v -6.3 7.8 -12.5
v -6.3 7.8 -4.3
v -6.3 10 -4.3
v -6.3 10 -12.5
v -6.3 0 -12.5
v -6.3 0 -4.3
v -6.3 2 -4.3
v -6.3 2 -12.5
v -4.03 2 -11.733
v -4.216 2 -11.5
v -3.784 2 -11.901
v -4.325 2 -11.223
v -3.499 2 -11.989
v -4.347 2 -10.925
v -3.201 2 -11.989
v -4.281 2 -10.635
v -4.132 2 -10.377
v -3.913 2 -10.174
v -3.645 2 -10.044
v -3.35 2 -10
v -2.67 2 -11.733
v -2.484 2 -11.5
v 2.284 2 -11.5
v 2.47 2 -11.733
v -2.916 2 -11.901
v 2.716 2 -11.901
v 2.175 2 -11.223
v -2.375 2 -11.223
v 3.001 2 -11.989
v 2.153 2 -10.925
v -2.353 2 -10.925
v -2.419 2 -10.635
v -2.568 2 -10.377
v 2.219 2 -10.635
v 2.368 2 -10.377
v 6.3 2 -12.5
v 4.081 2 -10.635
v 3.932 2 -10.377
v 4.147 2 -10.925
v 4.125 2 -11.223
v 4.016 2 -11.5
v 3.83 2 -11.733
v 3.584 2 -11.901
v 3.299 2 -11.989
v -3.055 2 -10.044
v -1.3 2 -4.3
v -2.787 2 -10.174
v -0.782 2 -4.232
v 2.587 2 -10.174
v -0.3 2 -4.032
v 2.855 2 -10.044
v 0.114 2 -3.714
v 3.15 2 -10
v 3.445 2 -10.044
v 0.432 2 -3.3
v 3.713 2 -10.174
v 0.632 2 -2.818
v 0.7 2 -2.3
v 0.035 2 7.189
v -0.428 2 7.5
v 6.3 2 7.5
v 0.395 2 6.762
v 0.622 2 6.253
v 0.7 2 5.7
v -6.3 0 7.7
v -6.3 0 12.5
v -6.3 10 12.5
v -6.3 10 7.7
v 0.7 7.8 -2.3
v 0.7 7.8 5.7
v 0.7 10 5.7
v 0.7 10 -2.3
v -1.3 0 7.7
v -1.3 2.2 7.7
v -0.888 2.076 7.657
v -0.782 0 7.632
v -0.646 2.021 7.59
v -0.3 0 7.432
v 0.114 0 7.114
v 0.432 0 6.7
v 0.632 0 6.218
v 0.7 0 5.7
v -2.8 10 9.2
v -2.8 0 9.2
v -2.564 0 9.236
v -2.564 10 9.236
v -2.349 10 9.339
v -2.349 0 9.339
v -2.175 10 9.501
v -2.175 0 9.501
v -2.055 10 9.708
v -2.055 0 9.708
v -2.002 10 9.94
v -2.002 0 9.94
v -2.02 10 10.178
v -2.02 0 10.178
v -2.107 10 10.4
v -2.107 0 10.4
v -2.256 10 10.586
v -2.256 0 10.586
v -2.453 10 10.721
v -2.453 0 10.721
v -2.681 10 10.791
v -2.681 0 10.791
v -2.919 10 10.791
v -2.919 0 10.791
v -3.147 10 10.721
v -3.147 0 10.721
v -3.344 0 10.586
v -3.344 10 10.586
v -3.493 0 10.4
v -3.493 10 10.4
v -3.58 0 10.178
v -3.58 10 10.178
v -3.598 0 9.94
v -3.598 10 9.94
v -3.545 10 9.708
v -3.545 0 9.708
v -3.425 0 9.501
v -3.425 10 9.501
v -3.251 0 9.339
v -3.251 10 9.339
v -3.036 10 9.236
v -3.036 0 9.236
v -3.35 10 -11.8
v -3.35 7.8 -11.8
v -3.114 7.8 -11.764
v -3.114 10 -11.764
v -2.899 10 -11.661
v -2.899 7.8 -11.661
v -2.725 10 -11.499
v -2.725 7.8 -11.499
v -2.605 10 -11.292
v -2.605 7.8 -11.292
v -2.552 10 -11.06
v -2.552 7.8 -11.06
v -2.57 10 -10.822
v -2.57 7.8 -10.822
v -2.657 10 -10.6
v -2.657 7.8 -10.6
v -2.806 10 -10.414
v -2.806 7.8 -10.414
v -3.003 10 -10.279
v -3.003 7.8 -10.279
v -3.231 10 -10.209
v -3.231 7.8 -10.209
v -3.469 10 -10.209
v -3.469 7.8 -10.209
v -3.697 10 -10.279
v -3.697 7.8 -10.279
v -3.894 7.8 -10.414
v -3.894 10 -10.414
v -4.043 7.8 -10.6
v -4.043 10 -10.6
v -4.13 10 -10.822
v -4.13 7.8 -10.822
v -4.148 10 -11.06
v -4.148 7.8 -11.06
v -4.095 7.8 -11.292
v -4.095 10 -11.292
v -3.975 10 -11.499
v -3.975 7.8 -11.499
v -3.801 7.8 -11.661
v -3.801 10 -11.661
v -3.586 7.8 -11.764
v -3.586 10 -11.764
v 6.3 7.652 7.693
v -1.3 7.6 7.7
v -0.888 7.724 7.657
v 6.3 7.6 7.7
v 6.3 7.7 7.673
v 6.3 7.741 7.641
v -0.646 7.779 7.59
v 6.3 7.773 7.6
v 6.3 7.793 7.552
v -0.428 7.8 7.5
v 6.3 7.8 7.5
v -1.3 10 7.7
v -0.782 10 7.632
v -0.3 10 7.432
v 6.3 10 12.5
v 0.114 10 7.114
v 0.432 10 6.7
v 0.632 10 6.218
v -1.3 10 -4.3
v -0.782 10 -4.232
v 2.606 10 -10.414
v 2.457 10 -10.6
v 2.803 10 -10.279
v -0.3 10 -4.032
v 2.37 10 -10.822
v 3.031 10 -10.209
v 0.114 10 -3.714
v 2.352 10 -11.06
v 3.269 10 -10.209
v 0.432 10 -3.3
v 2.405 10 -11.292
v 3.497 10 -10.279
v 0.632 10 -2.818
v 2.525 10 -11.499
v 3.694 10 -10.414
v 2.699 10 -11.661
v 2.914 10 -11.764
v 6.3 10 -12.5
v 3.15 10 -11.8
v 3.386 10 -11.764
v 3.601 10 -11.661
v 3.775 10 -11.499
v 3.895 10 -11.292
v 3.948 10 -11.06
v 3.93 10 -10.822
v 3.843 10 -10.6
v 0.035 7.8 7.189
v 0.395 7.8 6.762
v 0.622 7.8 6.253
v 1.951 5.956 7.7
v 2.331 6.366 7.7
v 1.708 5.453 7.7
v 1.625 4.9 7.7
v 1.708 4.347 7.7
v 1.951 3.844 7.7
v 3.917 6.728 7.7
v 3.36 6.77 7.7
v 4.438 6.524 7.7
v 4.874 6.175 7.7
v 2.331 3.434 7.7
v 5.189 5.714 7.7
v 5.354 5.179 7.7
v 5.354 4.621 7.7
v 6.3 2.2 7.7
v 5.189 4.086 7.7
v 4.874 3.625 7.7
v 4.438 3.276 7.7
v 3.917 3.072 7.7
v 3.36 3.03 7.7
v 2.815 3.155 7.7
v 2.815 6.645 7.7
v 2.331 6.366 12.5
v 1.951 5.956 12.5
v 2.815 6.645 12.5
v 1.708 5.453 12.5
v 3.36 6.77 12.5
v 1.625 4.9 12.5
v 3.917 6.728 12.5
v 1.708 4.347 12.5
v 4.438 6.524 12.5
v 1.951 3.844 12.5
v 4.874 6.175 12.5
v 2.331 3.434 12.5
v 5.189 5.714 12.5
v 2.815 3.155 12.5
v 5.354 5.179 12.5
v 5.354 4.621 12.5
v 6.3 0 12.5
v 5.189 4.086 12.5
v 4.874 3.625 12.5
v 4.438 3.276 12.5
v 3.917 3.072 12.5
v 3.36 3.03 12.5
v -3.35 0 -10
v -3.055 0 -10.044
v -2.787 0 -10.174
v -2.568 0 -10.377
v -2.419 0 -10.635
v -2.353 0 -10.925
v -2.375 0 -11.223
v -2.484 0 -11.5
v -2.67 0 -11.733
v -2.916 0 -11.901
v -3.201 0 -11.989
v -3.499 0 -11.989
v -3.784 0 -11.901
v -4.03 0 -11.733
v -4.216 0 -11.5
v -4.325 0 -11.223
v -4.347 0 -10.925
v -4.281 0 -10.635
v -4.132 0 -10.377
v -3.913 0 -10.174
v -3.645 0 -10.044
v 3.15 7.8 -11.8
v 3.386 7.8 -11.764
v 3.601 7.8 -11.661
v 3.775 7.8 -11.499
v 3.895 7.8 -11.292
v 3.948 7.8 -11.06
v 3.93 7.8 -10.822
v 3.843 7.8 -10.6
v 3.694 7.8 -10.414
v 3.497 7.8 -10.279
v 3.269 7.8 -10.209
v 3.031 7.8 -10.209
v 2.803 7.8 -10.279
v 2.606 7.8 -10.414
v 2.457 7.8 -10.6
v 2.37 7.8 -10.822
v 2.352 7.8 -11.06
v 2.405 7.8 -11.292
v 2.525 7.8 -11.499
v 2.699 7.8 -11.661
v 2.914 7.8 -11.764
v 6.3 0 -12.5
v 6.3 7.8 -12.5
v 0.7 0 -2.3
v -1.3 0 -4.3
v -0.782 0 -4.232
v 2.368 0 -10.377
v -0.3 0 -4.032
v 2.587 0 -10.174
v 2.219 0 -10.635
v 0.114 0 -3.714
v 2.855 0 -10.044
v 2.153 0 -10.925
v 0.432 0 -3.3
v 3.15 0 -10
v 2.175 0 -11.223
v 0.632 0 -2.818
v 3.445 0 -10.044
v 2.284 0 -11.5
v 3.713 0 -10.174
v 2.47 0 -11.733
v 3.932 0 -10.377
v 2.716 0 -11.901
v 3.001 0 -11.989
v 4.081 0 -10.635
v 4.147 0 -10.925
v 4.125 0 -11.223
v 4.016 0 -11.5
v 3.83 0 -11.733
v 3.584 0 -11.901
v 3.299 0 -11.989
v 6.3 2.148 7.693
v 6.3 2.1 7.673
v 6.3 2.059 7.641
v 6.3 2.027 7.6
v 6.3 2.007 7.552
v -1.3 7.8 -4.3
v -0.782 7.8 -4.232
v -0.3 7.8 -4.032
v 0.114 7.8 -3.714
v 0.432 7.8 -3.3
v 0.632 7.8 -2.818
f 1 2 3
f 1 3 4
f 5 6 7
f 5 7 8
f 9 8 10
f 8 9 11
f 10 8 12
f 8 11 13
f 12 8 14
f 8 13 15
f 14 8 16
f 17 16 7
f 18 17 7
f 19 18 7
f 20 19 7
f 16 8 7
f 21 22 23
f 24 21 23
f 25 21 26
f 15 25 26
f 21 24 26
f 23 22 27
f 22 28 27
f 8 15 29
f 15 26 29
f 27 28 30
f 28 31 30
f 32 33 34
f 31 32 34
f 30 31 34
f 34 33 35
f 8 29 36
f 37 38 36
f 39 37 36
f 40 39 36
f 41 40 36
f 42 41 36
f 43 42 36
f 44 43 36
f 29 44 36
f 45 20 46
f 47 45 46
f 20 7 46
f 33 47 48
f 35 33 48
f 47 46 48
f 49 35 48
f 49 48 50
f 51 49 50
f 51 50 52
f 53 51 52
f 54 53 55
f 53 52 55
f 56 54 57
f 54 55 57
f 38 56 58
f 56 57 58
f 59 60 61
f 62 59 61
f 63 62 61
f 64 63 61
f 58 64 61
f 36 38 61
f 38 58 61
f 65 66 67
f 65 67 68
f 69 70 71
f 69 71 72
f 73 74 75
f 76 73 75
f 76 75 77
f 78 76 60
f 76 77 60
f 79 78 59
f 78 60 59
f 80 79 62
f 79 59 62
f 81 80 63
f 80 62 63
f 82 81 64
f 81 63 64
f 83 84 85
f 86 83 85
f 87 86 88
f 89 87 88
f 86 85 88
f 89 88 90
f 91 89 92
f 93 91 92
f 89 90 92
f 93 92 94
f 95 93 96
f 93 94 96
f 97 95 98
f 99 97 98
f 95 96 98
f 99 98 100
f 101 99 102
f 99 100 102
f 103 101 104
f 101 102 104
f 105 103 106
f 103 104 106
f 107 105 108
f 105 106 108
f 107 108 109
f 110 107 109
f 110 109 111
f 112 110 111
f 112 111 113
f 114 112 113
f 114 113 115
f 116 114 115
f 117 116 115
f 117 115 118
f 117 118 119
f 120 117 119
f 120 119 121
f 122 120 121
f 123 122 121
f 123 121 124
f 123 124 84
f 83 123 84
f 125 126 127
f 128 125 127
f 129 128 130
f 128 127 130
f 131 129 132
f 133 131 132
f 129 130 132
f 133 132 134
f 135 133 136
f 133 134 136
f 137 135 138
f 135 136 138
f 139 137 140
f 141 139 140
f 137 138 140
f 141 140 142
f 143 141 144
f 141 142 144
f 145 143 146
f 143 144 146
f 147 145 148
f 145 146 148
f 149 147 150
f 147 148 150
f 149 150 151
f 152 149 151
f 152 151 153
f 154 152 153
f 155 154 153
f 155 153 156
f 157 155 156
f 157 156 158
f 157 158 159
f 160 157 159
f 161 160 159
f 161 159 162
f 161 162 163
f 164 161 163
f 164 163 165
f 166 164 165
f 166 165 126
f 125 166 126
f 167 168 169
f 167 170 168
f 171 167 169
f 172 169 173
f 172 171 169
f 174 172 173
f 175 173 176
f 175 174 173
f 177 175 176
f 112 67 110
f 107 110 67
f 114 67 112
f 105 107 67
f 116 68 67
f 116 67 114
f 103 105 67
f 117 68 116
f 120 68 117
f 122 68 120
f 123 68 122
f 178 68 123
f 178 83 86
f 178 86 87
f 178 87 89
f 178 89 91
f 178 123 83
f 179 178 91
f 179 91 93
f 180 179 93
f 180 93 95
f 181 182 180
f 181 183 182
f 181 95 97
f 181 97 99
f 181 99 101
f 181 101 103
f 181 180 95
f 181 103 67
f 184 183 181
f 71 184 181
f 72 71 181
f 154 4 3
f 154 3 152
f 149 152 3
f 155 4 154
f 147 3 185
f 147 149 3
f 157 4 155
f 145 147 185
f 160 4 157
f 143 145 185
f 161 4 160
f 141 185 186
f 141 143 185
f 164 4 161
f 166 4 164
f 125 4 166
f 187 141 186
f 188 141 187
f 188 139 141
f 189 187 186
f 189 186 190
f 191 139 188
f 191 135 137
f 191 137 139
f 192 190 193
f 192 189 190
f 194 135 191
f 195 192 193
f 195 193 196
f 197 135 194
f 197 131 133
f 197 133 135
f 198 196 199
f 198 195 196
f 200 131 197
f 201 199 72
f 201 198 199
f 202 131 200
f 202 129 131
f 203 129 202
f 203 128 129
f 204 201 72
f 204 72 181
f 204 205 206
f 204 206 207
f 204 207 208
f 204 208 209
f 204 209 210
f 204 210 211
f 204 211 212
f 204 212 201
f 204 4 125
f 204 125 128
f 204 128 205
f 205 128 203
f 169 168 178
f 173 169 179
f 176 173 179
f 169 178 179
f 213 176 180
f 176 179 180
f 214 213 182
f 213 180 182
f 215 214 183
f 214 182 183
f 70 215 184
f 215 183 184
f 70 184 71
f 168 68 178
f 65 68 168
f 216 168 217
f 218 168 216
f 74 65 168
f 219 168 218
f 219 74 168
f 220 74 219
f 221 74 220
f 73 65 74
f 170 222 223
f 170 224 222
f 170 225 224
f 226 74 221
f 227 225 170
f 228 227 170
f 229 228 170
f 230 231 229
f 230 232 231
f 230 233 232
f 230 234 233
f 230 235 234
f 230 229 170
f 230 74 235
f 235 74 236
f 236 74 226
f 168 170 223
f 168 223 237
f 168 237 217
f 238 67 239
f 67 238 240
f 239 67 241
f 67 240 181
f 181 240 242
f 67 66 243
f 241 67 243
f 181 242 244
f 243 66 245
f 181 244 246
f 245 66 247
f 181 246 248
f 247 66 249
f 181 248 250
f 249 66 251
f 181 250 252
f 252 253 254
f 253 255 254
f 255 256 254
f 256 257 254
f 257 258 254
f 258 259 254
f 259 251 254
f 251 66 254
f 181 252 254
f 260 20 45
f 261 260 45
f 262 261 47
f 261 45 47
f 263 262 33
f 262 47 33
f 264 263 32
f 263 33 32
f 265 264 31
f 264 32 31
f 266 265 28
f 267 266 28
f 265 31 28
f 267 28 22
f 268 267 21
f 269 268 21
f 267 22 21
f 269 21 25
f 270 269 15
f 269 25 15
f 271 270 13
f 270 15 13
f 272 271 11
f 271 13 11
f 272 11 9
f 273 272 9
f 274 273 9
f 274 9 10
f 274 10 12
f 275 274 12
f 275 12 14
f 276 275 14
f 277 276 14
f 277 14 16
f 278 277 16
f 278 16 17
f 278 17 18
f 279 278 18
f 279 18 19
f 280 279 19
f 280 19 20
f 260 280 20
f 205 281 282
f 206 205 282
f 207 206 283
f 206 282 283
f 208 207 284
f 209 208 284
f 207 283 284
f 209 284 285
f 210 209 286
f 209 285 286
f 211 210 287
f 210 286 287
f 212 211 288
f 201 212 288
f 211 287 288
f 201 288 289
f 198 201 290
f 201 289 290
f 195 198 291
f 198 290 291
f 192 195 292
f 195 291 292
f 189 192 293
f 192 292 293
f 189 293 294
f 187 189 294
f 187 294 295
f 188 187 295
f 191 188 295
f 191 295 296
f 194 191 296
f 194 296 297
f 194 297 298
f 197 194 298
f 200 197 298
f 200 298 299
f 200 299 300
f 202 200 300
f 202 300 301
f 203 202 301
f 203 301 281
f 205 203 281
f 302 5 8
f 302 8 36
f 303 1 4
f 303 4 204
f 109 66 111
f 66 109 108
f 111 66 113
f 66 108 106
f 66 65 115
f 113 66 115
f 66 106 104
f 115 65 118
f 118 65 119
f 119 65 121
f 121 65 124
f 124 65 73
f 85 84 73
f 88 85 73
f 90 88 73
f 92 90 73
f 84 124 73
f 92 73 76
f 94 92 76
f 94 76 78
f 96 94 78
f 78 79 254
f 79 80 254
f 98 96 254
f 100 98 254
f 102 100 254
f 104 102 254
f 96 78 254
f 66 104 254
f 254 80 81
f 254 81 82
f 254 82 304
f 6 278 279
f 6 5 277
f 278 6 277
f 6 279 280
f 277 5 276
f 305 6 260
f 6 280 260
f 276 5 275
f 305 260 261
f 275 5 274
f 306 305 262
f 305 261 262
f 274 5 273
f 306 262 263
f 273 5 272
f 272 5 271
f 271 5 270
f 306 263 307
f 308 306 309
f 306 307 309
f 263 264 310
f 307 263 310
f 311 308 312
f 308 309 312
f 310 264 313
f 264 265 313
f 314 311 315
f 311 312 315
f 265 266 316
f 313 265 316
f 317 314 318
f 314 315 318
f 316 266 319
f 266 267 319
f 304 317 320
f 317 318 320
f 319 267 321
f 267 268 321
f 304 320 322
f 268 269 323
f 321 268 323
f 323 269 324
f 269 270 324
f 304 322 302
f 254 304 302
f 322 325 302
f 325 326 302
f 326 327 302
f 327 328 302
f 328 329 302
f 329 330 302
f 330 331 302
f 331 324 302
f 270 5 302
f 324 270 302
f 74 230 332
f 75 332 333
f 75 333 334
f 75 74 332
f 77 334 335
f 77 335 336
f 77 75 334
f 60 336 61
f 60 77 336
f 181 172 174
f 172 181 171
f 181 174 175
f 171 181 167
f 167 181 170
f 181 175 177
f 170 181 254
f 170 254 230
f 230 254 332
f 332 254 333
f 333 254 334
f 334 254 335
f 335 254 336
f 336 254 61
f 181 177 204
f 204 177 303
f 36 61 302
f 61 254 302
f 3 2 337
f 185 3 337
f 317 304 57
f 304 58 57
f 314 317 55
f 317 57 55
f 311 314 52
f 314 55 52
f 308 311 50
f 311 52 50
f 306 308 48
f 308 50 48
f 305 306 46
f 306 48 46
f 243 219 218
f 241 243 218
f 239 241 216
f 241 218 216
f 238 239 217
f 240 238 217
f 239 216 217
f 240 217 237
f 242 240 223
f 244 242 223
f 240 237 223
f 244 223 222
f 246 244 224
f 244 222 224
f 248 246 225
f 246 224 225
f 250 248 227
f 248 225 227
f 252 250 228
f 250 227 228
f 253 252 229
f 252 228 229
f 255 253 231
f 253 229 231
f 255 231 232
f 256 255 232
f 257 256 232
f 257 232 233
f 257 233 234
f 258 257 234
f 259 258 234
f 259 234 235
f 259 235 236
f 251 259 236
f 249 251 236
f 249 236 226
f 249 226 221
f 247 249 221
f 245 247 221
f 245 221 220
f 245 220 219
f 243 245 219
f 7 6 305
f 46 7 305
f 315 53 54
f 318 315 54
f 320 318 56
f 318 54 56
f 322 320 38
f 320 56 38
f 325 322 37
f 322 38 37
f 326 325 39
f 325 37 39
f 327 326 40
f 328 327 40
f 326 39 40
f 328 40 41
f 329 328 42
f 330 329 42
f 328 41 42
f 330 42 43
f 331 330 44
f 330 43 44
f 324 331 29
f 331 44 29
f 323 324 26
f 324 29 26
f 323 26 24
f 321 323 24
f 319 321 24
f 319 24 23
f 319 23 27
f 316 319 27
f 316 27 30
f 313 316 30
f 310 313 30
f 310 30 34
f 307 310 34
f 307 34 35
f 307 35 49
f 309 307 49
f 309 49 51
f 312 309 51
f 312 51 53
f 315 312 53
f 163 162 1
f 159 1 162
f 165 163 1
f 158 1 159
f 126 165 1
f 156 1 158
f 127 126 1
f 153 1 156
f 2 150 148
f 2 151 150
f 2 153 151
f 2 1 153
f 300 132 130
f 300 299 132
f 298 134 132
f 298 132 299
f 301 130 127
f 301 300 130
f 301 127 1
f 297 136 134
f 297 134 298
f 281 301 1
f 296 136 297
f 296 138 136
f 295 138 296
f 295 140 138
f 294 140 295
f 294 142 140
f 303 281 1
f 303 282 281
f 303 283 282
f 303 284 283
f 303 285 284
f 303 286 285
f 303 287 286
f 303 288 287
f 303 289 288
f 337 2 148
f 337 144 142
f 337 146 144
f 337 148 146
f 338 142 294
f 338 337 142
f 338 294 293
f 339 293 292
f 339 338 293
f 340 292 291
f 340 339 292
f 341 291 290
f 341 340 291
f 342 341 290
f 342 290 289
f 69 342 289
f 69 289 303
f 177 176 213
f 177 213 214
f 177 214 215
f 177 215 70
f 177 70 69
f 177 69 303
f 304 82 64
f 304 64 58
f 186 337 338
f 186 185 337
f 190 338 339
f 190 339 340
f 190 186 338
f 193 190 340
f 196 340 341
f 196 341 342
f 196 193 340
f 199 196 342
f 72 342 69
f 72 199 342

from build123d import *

# Parameters (mm, degrees)
SKETCH1_W                   = 12.6
SKETCH1_H                   = 25
BOSS_EXTRUDE1_DEPTH         = 10
CUT_EXTRUDE1_START          = -4.8
SKETCH2_W                   = 7
SKETCH2_H                   = 5.8
CUT_EXTRUDE1_DEPTH          = 23.853028767
SKETCH3_W                   = 20.2
SKETCH3_H                   = 5.8
CUT_EXTRUDE2_DEPTH          = 18.47140521
SKETCH6_R                   = 1
CUT_EXTRUDE5_DEPTH          = 17.122654868
TAP_DRILL_FOR_M2X0_4_TAP1_D = 1.6
CUT_EXTRUDE6_DEPTH          = 17.122654868
CUT_EXTRUDE6_DEPTH_BACK     = 17.122654868
SKETCH9_W                   = 7
SKETCH9_H                   = 12
FILLET1_R                   = 2
SKETCH4_R                   = 1.875
CUT_EXTRUDE7_DEPTH          = 24.403632197
TAP_DRILL_FOR_M2X0_4_TAP4_D = 1.6
FILLET3_R                   = 0.2


with BuildPart() as part:
    # Sketch1 → Boss-Extrude1 (new body)
    with BuildSketch(Plane(origin=(0, 0, 0), x_dir=(1, 0, 0), z_dir=(0, 1, 0))):
        Rectangle(SKETCH1_W, SKETCH1_H)
    extrude(amount=BOSS_EXTRUDE1_DEPTH)

    # Sketch2 → Cut-Extrude1 (cut, through all)
    with BuildSketch(Plane.XY.offset(12.5).offset(CUT_EXTRUDE1_START)):
        with Locations((-2.8, 4.9)):
            Rectangle(SKETCH2_W, SKETCH2_H)
    extrude(amount=-CUT_EXTRUDE1_DEPTH, mode=Mode.SUBTRACT)

    # Sketch3 → Cut-Extrude2 (cut, through all)
    with BuildSketch(Plane.ZY.offset(-0.7)):
        with Locations((-2.4, 4.9)):
            Rectangle(SKETCH3_W, SKETCH3_H)
    extrude(amount=-CUT_EXTRUDE2_DEPTH, mode=Mode.SUBTRACT)

    # Sketch6 → Cut-Extrude5 (cut, through all)
    with BuildSketch(Plane(origin=(0, 2, 0), x_dir=(1, 0, 0), z_dir=(0, 1, 0))):
        with Locations((3.15, 11)):
            Circle(SKETCH6_R)
        with Locations((-3.35, 11)):
            Circle(SKETCH6_R)
    extrude(amount=-CUT_EXTRUDE5_DEPTH, mode=Mode.SUBTRACT)

    # Tap Drill for M2x0.4 Tap1 (through all)
    with Locations(Plane(origin=(3.15, 10, -11), x_dir=(0, 0, 1), z_dir=(0, 1, 0))):
        with Locations((0, 0), (0, -6.5)):
            Hole(TAP_DRILL_FOR_M2X0_4_TAP1_D / 2)

    # Sketch9 → Cut-Extrude6 (cut, two sides: drawn at the far end of the back side and taken through both)
    with BuildSketch(Plane(origin=(0, 2, 0), x_dir=(1, 0, 0), z_dir=(0, 1, 0)).offset(-CUT_EXTRUDE6_DEPTH_BACK)):
        with Locations((-2.8, -1.7)):
            Rectangle(SKETCH9_W, SKETCH9_H)
    extrude(amount=CUT_EXTRUDE6_DEPTH + CUT_EXTRUDE6_DEPTH_BACK, mode=Mode.SUBTRACT)

    # Fillet1
    fillet1_edges = [part.edges().sort_by_distance(p)[0] for p in [
        (0.7, 1, -4.3),
        (0.7, 1, 7.7),
        (0.7, 8.9, -4.3),
        (0.7, 8.9, 7.7),
    ]]
    fillet(fillet1_edges, radius=FILLET1_R)

    # Sketch4 → Cut-Extrude7 (cut, through all)
    with BuildSketch(Plane(origin=(0, 0, 7.7), x_dir=(-1, 0, 0), z_dir=(0, 0, -1))):
        with Locations((-3.5, 4.9)):
            Circle(SKETCH4_R)
    extrude(amount=-CUT_EXTRUDE7_DEPTH, mode=Mode.SUBTRACT)

    # Tap Drill for M2x0.4 Tap4 (through all)
    with Locations(Plane(origin=(-2.8, 10, 10), x_dir=(0, 0, 1), z_dir=(0, 1, 0))):
        with Locations((0, 0)):
            Hole(TAP_DRILL_FOR_M2X0_4_TAP4_D / 2)

    # Fillet3
    fillet3_edges = [part.edges().sort_by_distance(p)[0] for p in [
        (2.5, 2, 7.7),
        (2.5, 7.8, 7.7),
    ]]
    fillet(fillet3_edges, radius=FILLET3_R)


solid = part.part
